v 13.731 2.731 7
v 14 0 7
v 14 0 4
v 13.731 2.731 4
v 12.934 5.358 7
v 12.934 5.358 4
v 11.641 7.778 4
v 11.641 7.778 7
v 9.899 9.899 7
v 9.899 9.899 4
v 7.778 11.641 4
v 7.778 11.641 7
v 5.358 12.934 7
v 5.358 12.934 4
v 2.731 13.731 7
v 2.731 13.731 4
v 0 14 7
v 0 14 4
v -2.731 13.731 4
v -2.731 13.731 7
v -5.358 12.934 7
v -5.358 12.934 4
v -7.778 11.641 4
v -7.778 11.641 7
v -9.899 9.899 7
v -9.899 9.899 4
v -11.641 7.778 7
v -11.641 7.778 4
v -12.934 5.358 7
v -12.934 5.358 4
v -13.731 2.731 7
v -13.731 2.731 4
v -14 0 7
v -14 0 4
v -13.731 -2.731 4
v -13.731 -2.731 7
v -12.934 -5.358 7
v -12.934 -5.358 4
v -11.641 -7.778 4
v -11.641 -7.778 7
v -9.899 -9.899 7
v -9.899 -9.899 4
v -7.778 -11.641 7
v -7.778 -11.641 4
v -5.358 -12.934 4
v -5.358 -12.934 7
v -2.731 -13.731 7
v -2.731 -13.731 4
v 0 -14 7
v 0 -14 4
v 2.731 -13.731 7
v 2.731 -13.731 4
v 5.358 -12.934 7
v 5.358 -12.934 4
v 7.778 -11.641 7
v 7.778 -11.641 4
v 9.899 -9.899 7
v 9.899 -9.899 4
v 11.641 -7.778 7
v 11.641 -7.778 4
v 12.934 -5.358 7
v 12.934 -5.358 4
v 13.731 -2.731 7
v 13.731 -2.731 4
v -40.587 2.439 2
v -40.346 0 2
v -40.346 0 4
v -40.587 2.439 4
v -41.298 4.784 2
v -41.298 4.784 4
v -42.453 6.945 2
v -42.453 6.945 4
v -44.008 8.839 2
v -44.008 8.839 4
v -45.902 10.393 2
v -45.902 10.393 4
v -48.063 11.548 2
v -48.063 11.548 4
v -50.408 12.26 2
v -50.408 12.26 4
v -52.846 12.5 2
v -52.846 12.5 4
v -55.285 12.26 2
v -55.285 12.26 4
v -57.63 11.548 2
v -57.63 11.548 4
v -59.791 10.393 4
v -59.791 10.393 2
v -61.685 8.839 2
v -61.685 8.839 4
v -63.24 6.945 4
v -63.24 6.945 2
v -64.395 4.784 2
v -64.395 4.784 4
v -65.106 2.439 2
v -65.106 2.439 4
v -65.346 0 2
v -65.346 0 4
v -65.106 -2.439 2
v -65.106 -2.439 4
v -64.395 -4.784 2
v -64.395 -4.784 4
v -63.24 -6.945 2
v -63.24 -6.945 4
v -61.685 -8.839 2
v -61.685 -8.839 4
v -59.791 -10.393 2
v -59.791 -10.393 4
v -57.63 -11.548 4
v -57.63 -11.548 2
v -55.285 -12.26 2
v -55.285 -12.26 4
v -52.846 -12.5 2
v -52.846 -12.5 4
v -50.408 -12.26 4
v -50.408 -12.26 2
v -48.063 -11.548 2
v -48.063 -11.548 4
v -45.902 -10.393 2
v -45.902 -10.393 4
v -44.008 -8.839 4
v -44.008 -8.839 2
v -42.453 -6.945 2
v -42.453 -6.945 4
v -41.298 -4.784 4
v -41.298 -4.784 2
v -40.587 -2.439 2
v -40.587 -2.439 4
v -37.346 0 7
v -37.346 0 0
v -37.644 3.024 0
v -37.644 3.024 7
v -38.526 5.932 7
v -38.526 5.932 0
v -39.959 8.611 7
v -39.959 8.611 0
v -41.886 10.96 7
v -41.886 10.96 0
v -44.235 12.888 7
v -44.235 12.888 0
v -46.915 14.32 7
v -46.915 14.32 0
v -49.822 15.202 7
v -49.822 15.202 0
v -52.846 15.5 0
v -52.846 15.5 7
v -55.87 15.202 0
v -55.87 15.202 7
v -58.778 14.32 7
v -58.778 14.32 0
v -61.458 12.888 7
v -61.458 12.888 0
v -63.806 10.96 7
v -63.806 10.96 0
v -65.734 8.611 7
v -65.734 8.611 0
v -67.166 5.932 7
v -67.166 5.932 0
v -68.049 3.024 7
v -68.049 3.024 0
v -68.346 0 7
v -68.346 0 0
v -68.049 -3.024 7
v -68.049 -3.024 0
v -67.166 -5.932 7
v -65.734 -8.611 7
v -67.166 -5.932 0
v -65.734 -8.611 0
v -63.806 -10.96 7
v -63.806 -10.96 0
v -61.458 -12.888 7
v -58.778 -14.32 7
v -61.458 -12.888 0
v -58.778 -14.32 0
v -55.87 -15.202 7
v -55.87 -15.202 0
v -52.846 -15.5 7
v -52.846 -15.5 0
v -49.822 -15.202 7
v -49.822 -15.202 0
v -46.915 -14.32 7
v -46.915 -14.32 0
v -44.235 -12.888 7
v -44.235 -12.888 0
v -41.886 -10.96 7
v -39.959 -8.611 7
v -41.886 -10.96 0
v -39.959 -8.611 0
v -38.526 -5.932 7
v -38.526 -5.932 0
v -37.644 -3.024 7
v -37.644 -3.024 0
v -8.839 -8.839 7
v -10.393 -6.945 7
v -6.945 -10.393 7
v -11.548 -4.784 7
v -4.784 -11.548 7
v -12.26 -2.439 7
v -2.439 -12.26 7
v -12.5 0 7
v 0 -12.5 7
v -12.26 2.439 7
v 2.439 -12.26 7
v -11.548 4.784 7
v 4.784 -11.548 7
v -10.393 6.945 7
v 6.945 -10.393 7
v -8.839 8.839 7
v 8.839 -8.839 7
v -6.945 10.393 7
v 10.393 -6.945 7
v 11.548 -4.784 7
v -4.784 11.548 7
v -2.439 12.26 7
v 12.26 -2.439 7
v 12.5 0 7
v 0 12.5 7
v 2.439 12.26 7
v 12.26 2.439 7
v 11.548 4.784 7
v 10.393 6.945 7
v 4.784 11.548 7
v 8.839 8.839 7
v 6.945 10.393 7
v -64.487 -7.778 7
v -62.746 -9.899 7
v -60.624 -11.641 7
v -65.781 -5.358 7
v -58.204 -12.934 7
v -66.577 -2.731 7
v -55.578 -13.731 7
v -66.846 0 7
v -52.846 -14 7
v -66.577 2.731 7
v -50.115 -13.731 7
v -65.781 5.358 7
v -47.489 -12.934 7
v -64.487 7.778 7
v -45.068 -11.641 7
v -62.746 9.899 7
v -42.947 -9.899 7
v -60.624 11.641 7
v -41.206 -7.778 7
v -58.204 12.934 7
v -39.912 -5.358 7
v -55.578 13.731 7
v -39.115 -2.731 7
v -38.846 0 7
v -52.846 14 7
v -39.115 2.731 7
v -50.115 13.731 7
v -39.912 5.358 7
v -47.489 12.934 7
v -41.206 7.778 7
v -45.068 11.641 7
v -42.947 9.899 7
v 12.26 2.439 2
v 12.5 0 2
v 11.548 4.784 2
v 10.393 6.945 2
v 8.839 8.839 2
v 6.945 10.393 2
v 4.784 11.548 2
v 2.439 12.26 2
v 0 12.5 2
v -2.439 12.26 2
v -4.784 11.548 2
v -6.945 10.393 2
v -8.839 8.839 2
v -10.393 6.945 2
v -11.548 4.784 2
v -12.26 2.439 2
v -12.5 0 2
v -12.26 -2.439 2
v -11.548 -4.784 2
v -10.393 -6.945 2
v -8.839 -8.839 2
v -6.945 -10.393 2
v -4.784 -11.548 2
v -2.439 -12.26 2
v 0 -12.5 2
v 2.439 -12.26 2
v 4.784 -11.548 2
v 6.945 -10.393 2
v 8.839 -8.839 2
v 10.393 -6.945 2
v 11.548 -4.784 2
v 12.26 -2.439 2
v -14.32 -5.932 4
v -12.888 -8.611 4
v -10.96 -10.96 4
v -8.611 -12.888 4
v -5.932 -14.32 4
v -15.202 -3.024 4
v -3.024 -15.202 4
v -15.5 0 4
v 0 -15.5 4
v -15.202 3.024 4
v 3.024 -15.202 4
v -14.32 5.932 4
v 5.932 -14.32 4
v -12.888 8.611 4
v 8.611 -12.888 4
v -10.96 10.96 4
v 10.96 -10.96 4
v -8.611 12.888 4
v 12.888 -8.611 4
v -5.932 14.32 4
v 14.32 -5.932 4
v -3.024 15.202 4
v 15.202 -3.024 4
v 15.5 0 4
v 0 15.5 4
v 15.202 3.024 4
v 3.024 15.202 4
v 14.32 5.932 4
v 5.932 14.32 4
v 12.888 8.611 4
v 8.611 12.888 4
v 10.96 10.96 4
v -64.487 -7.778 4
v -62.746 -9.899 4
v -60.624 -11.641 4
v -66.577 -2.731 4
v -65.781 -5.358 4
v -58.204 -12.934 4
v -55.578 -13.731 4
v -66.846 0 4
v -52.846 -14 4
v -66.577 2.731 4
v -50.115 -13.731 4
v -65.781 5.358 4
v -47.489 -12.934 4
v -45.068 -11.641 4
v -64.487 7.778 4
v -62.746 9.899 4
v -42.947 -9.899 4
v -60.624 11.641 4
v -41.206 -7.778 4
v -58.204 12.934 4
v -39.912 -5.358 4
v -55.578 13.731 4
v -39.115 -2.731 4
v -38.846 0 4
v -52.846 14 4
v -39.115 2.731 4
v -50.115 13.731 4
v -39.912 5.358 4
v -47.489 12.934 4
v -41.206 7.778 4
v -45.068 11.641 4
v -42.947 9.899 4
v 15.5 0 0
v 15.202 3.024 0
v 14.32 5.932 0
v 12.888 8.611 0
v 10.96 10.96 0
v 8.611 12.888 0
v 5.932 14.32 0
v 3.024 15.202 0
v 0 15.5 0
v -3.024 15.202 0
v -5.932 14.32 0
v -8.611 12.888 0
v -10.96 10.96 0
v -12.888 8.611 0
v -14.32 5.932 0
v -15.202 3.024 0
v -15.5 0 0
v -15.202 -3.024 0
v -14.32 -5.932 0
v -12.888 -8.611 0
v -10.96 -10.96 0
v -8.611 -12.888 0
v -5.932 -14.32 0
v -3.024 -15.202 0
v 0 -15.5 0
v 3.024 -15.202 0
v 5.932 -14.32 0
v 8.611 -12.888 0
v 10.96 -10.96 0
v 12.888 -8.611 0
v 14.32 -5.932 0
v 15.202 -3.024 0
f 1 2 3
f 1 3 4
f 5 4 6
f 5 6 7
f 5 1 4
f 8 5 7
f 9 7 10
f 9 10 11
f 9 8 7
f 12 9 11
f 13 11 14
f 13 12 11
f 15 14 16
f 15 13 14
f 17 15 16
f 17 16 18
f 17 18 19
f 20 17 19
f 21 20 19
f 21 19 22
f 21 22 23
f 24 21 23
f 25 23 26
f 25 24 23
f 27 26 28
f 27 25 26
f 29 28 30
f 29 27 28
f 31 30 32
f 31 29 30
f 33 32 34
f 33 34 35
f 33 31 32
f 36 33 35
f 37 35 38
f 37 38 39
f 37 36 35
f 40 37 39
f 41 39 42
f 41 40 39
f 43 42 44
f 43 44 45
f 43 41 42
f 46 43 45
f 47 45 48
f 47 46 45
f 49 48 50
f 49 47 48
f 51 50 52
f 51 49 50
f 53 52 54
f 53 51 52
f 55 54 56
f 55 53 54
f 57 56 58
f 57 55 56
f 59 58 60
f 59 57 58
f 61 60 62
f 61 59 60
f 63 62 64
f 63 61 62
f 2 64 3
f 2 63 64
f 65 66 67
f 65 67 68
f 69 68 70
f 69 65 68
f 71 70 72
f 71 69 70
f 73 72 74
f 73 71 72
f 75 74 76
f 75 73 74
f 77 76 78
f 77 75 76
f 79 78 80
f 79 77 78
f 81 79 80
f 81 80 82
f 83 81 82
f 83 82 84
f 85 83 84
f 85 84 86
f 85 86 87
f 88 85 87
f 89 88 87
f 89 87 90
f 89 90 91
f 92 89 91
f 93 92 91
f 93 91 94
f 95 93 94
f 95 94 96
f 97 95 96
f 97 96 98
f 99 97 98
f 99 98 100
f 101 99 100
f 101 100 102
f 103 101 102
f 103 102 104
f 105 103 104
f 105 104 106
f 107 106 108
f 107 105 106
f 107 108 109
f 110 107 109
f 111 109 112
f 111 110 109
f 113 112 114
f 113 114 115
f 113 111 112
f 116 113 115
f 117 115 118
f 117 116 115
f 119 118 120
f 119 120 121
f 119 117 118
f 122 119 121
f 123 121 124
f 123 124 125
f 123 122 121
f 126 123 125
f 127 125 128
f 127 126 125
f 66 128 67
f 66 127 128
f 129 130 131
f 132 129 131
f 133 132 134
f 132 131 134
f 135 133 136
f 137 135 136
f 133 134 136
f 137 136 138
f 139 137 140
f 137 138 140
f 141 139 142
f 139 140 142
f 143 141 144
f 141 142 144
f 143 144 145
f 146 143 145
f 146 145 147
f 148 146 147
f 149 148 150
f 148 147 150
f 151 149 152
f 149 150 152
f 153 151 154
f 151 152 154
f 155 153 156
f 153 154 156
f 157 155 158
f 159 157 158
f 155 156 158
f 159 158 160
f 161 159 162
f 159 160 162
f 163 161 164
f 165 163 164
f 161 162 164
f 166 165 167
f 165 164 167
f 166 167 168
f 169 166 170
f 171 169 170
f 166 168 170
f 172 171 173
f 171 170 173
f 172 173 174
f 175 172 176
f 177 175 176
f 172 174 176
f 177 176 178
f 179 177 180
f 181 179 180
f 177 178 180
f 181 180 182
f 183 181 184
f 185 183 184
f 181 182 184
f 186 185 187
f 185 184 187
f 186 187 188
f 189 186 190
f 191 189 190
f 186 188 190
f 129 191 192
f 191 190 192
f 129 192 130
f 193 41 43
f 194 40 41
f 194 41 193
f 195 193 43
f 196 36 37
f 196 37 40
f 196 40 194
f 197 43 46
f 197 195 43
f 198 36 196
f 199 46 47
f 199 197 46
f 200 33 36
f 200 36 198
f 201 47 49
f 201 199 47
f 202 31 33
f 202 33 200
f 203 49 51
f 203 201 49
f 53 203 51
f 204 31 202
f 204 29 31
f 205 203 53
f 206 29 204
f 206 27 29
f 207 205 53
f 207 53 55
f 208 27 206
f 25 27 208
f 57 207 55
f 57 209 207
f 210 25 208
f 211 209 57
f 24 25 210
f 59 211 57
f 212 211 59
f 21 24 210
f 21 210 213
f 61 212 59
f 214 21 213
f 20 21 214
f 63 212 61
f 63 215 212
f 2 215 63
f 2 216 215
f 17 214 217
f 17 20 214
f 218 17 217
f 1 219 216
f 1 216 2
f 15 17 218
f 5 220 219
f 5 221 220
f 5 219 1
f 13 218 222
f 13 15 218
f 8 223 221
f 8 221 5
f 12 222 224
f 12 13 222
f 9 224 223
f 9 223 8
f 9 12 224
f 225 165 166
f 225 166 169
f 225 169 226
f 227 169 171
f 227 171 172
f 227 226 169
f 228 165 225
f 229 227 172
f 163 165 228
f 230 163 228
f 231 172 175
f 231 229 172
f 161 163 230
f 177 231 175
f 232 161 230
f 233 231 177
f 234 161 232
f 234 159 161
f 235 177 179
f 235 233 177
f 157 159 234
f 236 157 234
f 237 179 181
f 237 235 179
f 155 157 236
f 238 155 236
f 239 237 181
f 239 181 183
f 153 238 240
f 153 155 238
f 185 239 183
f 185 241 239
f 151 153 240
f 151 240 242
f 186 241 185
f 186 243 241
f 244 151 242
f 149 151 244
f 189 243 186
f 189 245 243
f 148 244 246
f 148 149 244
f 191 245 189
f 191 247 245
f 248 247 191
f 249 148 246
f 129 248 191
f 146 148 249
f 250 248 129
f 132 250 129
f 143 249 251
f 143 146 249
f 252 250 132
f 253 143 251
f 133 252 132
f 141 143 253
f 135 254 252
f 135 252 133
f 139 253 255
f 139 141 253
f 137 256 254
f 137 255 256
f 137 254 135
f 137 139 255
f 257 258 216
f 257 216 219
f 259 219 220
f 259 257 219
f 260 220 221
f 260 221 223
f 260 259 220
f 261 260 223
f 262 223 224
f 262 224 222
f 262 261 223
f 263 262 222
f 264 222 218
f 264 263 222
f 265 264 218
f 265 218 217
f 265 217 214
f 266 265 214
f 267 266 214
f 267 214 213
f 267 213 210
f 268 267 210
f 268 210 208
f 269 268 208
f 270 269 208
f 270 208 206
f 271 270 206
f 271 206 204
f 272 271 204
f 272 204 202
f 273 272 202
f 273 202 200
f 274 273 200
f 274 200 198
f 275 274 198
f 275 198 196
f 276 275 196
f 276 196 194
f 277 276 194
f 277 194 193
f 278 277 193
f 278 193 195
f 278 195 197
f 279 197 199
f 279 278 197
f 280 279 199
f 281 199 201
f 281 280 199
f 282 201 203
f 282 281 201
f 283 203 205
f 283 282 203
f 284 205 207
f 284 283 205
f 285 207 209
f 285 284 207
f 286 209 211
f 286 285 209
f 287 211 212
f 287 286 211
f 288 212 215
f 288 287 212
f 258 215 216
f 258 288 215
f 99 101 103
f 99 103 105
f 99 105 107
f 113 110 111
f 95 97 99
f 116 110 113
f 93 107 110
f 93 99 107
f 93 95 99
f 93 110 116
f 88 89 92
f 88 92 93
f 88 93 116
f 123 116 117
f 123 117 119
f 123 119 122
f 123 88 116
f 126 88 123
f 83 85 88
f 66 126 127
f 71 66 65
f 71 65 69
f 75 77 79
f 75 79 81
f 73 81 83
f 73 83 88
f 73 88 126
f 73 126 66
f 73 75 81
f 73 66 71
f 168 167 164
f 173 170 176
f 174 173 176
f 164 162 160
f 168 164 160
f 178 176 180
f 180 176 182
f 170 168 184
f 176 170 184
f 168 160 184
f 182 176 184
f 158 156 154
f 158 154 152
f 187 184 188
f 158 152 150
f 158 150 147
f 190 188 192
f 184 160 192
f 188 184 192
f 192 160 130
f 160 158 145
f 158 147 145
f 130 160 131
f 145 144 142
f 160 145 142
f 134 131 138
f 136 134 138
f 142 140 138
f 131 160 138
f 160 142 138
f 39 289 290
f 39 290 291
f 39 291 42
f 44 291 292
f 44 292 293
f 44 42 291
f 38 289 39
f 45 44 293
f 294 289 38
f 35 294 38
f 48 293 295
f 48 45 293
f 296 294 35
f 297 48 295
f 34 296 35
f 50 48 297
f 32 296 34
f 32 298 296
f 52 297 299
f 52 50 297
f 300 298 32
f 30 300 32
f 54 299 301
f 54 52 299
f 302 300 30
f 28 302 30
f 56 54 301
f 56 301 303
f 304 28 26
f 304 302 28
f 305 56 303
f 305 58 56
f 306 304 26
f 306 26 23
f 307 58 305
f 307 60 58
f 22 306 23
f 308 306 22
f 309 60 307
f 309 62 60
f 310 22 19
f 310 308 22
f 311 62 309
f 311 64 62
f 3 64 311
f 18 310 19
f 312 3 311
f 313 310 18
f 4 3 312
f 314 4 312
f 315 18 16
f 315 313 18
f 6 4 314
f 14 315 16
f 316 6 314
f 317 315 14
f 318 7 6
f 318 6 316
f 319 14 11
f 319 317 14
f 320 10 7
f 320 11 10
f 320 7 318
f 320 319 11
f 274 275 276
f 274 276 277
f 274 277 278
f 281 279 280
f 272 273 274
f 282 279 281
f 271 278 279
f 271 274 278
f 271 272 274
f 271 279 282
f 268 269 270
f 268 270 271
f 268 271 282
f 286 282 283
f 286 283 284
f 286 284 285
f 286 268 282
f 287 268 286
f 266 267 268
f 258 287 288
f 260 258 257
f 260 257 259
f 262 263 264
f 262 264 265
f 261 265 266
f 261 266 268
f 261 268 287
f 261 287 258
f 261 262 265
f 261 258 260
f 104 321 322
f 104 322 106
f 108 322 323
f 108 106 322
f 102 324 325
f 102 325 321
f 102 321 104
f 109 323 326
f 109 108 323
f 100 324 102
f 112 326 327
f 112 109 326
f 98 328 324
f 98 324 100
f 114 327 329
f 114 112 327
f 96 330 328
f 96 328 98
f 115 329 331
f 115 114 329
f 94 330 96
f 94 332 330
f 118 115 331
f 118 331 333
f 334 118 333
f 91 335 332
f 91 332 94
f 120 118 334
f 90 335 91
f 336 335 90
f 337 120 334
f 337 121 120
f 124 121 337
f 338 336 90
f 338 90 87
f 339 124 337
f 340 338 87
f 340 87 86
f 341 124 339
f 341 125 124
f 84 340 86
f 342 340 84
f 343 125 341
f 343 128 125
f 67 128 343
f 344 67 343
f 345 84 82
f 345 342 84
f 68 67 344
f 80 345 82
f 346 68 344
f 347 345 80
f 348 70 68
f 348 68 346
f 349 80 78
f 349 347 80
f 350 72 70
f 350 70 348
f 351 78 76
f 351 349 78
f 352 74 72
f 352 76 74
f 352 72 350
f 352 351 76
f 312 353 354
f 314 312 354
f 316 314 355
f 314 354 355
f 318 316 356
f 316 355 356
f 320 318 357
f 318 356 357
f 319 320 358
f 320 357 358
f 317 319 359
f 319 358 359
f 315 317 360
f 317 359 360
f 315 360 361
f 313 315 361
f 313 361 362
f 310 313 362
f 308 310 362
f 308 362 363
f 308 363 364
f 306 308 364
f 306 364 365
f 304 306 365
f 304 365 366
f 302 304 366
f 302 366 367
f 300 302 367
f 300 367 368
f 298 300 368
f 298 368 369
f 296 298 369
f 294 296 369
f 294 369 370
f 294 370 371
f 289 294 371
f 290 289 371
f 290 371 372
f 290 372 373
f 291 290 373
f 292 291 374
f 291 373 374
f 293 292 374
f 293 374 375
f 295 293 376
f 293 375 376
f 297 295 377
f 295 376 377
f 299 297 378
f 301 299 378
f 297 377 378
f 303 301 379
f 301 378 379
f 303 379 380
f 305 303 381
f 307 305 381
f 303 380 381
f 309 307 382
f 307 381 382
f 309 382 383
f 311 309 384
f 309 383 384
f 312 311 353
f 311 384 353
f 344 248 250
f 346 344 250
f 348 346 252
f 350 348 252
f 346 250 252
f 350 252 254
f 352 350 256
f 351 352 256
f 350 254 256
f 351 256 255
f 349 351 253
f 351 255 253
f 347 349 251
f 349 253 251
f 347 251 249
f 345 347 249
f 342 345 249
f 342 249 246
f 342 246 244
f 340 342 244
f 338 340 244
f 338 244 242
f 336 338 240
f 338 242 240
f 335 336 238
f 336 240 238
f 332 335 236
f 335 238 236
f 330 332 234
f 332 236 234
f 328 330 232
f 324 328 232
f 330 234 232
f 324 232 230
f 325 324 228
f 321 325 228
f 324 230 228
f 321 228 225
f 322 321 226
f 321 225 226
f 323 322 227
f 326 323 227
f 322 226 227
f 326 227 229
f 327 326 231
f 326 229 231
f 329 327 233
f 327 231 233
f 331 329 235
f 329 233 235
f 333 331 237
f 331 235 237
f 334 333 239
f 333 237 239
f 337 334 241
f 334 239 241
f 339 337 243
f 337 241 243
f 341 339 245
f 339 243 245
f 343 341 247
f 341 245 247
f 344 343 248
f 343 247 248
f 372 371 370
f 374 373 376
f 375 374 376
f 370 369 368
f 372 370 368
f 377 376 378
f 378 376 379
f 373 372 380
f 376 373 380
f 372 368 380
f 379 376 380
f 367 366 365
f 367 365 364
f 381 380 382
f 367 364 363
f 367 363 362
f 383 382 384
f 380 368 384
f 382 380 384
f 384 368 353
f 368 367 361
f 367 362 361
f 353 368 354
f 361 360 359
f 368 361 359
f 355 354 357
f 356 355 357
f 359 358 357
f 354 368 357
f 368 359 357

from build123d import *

# Parameters (mm, degrees)
F0_R     = 15.5
F0_R_2   = 12.5
F1_DEPTH = 7
F2_R     = 12.5
F3_DEPTH = 2
F4_R     = 14
F4_R_2   = 12.5
F4_R_3   = 15.5
F5_DEPTH = 3
F6_R     = 15.5
F6_R_2   = 14
F7_DEPTH = 3


with BuildPart() as f1:
    # F0 (on Top) → F1 (new body)
    with BuildSketch(Plane.XY):
        with Locations((-52.846339, 0)):
            Circle(F0_R)
        with Locations((-52.846339, 0)):
            Circle(F0_R_2, mode=Mode.SUBTRACT)
        Circle(F0_R)
        Circle(F0_R_2, mode=Mode.SUBTRACT)
    extrude(amount=F1_DEPTH)

    # F2 (on Top) → F3 (join)
    with BuildSketch(Plane.XY):
        with Locations((-52.846339, 0)):
            Circle(F2_R)
        Circle(F2_R)
    extrude(amount=F3_DEPTH)

    # F4 (on face) → F5 (cut)
    with BuildSketch(Plane.XY.offset(7)):
        with Locations((-52.846339, 0)):
            Circle(F4_R)
        with Locations((-52.846339, 0)):
            Circle(F4_R_2, mode=Mode.SUBTRACT)
        Circle(F4_R_3)
        Circle(F4_R, mode=Mode.SUBTRACT)
    extrude(amount=-F5_DEPTH, mode=Mode.SUBTRACT)

    # F6 (on face) → F7 (cut)
    with BuildSketch(Plane.XY.offset(7)):
        Circle(F6_R)
        Circle(F6_R_2, mode=Mode.SUBTRACT)
    extrude(amount=-F7_DEPTH, mode=Mode.SUBTRACT)


solid = f1.part
